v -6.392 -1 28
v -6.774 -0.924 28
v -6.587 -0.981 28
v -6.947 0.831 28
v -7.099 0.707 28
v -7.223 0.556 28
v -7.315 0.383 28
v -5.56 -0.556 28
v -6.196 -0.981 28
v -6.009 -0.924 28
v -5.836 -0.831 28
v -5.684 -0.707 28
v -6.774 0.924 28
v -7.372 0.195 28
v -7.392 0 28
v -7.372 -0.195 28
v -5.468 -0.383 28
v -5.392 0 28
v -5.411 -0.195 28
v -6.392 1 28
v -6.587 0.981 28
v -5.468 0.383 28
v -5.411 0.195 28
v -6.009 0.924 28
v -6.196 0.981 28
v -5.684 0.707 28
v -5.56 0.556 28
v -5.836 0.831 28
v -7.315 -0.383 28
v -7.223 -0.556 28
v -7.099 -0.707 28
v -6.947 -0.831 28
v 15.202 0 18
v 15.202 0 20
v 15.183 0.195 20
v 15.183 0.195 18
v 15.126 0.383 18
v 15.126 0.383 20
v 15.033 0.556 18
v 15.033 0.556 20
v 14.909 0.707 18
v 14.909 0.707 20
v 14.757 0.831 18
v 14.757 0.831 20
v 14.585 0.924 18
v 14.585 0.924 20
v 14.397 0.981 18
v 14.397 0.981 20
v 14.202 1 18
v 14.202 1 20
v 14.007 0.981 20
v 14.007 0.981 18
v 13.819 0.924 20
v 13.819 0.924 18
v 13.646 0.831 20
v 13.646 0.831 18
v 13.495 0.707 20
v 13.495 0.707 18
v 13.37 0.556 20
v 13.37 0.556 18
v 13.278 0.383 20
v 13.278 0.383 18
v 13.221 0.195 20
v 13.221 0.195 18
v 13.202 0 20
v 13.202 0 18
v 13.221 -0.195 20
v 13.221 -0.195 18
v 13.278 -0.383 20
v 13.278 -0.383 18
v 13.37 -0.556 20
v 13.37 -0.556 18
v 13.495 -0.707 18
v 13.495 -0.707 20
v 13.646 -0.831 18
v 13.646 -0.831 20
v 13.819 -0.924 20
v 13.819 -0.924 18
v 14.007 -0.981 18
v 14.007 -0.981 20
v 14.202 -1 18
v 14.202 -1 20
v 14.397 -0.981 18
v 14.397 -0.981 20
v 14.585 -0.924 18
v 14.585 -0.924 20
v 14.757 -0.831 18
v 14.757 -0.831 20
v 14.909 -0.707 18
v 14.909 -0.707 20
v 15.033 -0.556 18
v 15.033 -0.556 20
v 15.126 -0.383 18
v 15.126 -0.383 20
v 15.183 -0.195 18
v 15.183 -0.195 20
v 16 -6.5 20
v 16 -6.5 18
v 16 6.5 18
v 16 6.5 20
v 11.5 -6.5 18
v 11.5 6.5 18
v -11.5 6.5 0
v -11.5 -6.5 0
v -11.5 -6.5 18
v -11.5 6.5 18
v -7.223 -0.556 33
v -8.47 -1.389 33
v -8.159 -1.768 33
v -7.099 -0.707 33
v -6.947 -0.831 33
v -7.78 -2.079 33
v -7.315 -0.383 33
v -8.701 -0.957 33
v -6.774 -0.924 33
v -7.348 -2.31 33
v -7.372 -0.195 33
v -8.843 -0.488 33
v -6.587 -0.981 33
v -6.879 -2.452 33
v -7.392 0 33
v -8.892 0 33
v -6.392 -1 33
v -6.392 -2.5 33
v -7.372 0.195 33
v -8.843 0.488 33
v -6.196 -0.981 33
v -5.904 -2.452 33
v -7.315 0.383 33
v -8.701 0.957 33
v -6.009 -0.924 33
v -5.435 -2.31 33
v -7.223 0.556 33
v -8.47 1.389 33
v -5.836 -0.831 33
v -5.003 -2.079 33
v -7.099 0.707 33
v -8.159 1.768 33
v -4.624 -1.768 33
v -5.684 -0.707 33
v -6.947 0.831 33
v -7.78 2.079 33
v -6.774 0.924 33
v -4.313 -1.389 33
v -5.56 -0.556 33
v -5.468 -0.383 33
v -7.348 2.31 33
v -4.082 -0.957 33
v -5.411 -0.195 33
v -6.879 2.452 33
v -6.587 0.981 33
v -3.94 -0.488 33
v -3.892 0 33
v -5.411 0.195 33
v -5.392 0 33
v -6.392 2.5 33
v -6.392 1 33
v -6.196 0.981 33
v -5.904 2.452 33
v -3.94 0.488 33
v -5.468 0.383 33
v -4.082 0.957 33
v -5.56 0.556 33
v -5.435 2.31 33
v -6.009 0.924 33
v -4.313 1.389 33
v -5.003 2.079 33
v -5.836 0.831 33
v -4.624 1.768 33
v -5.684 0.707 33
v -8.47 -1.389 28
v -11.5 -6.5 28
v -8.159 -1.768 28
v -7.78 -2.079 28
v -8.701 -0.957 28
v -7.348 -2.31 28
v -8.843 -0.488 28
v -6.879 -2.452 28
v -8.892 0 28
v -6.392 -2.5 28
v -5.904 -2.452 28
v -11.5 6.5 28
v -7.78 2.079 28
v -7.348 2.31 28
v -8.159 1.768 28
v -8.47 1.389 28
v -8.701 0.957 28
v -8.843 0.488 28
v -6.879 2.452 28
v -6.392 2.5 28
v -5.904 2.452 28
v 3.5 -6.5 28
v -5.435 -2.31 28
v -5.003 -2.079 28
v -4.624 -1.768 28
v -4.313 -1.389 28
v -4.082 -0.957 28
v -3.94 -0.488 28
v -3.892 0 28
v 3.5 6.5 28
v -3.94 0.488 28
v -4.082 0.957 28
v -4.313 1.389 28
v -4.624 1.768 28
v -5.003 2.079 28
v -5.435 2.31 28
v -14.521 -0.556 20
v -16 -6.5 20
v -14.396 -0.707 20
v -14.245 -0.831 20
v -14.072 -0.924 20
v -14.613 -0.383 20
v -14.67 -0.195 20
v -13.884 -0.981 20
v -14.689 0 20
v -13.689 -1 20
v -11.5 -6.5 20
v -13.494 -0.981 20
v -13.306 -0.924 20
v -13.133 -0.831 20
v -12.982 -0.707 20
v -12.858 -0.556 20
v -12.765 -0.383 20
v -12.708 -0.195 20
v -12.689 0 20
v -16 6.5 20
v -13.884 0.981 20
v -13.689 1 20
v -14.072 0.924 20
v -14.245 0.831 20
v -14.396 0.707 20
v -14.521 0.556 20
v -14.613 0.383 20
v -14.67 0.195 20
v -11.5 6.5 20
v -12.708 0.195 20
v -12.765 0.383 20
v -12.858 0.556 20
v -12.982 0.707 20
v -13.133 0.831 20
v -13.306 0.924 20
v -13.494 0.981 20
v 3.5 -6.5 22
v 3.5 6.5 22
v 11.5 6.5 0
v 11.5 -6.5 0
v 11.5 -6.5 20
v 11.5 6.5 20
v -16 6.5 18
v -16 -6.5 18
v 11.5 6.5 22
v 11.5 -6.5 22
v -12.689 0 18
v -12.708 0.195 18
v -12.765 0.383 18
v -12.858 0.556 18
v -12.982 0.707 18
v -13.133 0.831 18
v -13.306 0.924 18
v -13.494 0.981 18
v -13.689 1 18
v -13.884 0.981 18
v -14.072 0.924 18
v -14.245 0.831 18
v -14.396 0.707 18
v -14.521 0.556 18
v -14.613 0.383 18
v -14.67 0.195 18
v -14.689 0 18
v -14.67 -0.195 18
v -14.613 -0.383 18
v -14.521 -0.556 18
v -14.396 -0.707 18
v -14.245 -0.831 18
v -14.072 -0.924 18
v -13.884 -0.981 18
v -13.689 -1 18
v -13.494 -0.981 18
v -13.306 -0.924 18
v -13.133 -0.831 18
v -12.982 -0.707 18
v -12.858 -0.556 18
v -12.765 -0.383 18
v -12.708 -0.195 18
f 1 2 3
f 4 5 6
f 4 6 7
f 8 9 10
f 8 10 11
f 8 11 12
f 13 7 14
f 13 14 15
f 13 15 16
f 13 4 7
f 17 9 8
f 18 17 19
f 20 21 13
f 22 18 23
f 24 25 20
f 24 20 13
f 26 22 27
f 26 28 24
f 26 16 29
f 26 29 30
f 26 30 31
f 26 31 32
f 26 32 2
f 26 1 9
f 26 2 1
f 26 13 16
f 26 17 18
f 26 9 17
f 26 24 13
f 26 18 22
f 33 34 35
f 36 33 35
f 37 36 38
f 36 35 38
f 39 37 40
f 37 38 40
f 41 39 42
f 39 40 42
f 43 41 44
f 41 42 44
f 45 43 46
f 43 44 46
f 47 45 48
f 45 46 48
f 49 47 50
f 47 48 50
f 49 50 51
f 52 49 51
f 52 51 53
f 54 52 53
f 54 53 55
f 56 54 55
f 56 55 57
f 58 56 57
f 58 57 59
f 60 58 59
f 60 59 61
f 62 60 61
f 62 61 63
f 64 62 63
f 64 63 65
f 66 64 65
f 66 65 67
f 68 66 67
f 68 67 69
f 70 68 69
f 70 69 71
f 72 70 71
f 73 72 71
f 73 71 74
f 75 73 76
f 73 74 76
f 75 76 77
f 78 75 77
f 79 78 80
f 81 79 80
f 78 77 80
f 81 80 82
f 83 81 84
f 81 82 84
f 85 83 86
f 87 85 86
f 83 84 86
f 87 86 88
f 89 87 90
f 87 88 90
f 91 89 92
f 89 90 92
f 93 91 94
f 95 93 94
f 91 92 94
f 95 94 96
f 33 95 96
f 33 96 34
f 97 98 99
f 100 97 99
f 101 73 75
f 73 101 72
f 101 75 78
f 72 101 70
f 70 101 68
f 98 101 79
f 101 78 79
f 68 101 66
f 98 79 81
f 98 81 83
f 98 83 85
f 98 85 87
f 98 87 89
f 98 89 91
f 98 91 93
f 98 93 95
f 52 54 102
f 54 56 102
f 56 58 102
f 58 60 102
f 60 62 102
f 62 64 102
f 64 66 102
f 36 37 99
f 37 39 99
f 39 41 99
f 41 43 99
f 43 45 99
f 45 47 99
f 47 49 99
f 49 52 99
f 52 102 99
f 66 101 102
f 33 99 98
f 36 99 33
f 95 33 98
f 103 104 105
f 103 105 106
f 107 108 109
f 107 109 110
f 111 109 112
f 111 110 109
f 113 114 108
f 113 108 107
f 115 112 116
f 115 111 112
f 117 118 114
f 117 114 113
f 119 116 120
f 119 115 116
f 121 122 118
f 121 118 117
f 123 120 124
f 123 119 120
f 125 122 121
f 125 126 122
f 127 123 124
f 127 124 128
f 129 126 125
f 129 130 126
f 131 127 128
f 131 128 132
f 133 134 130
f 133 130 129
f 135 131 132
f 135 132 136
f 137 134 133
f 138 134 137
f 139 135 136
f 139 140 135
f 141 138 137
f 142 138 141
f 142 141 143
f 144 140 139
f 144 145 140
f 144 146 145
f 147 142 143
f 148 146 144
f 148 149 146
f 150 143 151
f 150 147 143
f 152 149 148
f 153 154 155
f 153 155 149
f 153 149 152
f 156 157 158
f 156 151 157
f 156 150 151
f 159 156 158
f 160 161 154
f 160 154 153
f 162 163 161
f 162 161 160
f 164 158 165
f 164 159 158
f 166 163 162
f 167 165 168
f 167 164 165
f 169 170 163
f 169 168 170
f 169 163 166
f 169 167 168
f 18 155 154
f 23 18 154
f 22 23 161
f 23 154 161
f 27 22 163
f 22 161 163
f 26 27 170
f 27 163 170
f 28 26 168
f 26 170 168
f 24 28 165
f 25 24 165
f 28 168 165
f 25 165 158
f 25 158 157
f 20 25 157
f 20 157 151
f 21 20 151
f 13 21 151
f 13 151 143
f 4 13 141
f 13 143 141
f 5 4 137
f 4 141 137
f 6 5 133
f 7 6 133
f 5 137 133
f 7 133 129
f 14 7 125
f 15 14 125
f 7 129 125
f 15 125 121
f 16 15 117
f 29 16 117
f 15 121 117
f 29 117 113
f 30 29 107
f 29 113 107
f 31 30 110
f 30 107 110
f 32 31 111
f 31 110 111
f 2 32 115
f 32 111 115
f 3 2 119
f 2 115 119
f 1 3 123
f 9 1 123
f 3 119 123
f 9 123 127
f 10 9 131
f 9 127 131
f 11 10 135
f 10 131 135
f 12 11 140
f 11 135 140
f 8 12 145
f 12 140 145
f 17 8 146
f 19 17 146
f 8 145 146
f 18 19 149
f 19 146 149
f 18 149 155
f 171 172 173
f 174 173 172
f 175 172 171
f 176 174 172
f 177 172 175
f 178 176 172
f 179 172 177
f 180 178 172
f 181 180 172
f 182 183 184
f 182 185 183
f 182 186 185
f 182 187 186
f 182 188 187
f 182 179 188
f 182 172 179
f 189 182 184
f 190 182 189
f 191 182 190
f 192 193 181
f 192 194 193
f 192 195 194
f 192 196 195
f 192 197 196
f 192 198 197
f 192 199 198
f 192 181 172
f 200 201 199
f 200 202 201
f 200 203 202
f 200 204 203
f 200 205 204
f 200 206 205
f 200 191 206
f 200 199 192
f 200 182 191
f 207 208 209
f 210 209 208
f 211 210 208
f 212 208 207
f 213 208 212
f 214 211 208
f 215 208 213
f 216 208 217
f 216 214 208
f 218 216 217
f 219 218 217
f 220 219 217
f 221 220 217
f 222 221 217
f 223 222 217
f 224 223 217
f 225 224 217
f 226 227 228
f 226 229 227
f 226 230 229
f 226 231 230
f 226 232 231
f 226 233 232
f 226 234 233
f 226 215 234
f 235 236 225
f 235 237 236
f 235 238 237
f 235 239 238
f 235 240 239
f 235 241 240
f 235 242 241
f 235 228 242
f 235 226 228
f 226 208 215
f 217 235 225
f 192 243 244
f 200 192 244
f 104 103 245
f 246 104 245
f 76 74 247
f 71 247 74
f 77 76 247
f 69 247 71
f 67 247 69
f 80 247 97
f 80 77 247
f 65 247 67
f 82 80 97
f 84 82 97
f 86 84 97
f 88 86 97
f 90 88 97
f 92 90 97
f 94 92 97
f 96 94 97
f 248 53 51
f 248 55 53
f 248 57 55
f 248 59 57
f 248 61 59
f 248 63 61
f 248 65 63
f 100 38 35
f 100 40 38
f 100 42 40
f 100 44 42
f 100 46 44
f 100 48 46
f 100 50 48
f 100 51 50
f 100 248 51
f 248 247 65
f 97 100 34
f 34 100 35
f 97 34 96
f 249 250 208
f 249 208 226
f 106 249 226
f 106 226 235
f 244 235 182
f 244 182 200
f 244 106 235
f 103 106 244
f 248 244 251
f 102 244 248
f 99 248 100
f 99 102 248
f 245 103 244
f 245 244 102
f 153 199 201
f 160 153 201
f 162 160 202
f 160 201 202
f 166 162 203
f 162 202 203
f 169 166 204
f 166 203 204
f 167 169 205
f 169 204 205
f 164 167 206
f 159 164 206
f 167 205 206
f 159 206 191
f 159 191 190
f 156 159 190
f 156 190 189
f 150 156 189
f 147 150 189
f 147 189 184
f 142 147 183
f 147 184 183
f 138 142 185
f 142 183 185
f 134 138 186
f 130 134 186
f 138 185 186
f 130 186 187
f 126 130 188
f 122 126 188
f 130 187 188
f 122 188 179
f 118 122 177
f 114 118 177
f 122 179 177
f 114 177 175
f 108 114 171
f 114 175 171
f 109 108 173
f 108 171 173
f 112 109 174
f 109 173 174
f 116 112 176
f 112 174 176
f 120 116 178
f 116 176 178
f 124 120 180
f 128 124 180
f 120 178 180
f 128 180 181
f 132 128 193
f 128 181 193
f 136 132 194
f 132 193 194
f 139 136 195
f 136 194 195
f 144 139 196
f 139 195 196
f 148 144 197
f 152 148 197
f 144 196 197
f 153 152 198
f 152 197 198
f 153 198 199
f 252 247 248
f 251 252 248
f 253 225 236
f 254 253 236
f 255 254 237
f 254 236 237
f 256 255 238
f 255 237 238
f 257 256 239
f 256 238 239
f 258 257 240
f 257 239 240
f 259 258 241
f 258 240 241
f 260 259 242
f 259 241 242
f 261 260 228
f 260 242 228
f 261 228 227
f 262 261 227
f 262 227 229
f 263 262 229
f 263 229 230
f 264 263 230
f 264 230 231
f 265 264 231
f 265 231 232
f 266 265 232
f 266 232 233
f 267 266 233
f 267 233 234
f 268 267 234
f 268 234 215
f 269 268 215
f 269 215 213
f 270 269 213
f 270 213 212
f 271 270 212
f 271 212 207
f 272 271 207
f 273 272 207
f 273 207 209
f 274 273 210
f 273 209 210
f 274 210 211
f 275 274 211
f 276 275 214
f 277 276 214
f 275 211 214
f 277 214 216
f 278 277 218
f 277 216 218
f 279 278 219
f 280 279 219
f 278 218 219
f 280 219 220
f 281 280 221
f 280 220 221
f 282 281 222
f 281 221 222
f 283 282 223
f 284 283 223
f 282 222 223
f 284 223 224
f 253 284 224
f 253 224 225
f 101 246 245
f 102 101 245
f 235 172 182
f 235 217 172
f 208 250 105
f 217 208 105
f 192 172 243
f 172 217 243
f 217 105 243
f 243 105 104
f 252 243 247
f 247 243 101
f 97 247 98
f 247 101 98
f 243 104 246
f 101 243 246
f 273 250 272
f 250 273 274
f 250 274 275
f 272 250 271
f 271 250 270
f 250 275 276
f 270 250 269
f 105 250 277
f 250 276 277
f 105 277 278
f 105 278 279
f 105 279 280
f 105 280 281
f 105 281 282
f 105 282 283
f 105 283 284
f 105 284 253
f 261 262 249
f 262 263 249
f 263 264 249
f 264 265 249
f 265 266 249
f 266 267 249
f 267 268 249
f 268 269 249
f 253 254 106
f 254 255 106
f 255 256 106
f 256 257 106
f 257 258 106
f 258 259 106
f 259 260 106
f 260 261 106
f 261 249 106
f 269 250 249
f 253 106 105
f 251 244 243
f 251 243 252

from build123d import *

# Parameters (mm, degrees)
SKETCH1_W           = 23
SKETCH1_H           = 13
BOSS_EXTRUDE1_DEPTH = 18
SKETCH2_W           = 32
SKETCH2_H           = 13
BOSS_EXTRUDE2_DEPTH = 2
SKETCH3_W           = 23
SKETCH3_H           = 13
BOSS_EXTRUDE3_DEPTH = 2
SKETCH4_W           = 15
SKETCH4_H           = 13
BOSS_EXTRUDE4_DEPTH = 6
SKETCH5_R           = 2.5
BOSS_EXTRUDE5_DEPTH = 5
SKETCH6_R           = 1
CUT_EXTRUDE1_DEPTH  = 5
SKETCH7_R           = 1
CUT_EXTRUDE2_DEPTH  = 5


with BuildPart() as part:
    # Sketch1 → Boss-Extrude1 (new body)
    with BuildSketch(Plane.XY):
        Rectangle(SKETCH1_W, SKETCH1_H)
    extrude(amount=BOSS_EXTRUDE1_DEPTH)

    # Sketch2 → Boss-Extrude2 (add)
    with BuildSketch(Plane.XY.offset(18)):
        Rectangle(SKETCH2_W, SKETCH2_H)
    extrude(amount=BOSS_EXTRUDE2_DEPTH)

    # Sketch3 → Boss-Extrude3 (add)
    with BuildSketch(Plane.XY.offset(20)):
        Rectangle(SKETCH3_W, SKETCH3_H)
    extrude(amount=BOSS_EXTRUDE3_DEPTH)

    # Sketch4 → Boss-Extrude4 (add)
    with BuildSketch(Plane.XY.offset(22)):
        with Locations((-4, 0)):
            Rectangle(SKETCH4_W, SKETCH4_H)
    extrude(amount=BOSS_EXTRUDE4_DEPTH)

    # Sketch5 → Boss-Extrude5 (add)
    with BuildSketch(Plane.XY.offset(28)):
        with Locations((-6.391509612, 0)):
            Circle(SKETCH5_R)
    extrude(amount=BOSS_EXTRUDE5_DEPTH)

    # Sketch6 → Cut-Extrude1 (cut)
    with BuildSketch(Plane.XY.offset(33)):
        with Locations((-6.391509612, 0)):
            Circle(SKETCH6_R)
    extrude(amount=-CUT_EXTRUDE1_DEPTH, mode=Mode.SUBTRACT)

    # Sketch7 → Cut-Extrude2 (cut)
    with BuildSketch(Plane.XY.offset(20)):
        with Locations((-13.689061623, 0)):
            Circle(SKETCH7_R)
        with Locations((14.201879184, 0)):
            Circle(SKETCH7_R)
    extrude(amount=-CUT_EXTRUDE2_DEPTH, mode=Mode.SUBTRACT)


solid = part.part
